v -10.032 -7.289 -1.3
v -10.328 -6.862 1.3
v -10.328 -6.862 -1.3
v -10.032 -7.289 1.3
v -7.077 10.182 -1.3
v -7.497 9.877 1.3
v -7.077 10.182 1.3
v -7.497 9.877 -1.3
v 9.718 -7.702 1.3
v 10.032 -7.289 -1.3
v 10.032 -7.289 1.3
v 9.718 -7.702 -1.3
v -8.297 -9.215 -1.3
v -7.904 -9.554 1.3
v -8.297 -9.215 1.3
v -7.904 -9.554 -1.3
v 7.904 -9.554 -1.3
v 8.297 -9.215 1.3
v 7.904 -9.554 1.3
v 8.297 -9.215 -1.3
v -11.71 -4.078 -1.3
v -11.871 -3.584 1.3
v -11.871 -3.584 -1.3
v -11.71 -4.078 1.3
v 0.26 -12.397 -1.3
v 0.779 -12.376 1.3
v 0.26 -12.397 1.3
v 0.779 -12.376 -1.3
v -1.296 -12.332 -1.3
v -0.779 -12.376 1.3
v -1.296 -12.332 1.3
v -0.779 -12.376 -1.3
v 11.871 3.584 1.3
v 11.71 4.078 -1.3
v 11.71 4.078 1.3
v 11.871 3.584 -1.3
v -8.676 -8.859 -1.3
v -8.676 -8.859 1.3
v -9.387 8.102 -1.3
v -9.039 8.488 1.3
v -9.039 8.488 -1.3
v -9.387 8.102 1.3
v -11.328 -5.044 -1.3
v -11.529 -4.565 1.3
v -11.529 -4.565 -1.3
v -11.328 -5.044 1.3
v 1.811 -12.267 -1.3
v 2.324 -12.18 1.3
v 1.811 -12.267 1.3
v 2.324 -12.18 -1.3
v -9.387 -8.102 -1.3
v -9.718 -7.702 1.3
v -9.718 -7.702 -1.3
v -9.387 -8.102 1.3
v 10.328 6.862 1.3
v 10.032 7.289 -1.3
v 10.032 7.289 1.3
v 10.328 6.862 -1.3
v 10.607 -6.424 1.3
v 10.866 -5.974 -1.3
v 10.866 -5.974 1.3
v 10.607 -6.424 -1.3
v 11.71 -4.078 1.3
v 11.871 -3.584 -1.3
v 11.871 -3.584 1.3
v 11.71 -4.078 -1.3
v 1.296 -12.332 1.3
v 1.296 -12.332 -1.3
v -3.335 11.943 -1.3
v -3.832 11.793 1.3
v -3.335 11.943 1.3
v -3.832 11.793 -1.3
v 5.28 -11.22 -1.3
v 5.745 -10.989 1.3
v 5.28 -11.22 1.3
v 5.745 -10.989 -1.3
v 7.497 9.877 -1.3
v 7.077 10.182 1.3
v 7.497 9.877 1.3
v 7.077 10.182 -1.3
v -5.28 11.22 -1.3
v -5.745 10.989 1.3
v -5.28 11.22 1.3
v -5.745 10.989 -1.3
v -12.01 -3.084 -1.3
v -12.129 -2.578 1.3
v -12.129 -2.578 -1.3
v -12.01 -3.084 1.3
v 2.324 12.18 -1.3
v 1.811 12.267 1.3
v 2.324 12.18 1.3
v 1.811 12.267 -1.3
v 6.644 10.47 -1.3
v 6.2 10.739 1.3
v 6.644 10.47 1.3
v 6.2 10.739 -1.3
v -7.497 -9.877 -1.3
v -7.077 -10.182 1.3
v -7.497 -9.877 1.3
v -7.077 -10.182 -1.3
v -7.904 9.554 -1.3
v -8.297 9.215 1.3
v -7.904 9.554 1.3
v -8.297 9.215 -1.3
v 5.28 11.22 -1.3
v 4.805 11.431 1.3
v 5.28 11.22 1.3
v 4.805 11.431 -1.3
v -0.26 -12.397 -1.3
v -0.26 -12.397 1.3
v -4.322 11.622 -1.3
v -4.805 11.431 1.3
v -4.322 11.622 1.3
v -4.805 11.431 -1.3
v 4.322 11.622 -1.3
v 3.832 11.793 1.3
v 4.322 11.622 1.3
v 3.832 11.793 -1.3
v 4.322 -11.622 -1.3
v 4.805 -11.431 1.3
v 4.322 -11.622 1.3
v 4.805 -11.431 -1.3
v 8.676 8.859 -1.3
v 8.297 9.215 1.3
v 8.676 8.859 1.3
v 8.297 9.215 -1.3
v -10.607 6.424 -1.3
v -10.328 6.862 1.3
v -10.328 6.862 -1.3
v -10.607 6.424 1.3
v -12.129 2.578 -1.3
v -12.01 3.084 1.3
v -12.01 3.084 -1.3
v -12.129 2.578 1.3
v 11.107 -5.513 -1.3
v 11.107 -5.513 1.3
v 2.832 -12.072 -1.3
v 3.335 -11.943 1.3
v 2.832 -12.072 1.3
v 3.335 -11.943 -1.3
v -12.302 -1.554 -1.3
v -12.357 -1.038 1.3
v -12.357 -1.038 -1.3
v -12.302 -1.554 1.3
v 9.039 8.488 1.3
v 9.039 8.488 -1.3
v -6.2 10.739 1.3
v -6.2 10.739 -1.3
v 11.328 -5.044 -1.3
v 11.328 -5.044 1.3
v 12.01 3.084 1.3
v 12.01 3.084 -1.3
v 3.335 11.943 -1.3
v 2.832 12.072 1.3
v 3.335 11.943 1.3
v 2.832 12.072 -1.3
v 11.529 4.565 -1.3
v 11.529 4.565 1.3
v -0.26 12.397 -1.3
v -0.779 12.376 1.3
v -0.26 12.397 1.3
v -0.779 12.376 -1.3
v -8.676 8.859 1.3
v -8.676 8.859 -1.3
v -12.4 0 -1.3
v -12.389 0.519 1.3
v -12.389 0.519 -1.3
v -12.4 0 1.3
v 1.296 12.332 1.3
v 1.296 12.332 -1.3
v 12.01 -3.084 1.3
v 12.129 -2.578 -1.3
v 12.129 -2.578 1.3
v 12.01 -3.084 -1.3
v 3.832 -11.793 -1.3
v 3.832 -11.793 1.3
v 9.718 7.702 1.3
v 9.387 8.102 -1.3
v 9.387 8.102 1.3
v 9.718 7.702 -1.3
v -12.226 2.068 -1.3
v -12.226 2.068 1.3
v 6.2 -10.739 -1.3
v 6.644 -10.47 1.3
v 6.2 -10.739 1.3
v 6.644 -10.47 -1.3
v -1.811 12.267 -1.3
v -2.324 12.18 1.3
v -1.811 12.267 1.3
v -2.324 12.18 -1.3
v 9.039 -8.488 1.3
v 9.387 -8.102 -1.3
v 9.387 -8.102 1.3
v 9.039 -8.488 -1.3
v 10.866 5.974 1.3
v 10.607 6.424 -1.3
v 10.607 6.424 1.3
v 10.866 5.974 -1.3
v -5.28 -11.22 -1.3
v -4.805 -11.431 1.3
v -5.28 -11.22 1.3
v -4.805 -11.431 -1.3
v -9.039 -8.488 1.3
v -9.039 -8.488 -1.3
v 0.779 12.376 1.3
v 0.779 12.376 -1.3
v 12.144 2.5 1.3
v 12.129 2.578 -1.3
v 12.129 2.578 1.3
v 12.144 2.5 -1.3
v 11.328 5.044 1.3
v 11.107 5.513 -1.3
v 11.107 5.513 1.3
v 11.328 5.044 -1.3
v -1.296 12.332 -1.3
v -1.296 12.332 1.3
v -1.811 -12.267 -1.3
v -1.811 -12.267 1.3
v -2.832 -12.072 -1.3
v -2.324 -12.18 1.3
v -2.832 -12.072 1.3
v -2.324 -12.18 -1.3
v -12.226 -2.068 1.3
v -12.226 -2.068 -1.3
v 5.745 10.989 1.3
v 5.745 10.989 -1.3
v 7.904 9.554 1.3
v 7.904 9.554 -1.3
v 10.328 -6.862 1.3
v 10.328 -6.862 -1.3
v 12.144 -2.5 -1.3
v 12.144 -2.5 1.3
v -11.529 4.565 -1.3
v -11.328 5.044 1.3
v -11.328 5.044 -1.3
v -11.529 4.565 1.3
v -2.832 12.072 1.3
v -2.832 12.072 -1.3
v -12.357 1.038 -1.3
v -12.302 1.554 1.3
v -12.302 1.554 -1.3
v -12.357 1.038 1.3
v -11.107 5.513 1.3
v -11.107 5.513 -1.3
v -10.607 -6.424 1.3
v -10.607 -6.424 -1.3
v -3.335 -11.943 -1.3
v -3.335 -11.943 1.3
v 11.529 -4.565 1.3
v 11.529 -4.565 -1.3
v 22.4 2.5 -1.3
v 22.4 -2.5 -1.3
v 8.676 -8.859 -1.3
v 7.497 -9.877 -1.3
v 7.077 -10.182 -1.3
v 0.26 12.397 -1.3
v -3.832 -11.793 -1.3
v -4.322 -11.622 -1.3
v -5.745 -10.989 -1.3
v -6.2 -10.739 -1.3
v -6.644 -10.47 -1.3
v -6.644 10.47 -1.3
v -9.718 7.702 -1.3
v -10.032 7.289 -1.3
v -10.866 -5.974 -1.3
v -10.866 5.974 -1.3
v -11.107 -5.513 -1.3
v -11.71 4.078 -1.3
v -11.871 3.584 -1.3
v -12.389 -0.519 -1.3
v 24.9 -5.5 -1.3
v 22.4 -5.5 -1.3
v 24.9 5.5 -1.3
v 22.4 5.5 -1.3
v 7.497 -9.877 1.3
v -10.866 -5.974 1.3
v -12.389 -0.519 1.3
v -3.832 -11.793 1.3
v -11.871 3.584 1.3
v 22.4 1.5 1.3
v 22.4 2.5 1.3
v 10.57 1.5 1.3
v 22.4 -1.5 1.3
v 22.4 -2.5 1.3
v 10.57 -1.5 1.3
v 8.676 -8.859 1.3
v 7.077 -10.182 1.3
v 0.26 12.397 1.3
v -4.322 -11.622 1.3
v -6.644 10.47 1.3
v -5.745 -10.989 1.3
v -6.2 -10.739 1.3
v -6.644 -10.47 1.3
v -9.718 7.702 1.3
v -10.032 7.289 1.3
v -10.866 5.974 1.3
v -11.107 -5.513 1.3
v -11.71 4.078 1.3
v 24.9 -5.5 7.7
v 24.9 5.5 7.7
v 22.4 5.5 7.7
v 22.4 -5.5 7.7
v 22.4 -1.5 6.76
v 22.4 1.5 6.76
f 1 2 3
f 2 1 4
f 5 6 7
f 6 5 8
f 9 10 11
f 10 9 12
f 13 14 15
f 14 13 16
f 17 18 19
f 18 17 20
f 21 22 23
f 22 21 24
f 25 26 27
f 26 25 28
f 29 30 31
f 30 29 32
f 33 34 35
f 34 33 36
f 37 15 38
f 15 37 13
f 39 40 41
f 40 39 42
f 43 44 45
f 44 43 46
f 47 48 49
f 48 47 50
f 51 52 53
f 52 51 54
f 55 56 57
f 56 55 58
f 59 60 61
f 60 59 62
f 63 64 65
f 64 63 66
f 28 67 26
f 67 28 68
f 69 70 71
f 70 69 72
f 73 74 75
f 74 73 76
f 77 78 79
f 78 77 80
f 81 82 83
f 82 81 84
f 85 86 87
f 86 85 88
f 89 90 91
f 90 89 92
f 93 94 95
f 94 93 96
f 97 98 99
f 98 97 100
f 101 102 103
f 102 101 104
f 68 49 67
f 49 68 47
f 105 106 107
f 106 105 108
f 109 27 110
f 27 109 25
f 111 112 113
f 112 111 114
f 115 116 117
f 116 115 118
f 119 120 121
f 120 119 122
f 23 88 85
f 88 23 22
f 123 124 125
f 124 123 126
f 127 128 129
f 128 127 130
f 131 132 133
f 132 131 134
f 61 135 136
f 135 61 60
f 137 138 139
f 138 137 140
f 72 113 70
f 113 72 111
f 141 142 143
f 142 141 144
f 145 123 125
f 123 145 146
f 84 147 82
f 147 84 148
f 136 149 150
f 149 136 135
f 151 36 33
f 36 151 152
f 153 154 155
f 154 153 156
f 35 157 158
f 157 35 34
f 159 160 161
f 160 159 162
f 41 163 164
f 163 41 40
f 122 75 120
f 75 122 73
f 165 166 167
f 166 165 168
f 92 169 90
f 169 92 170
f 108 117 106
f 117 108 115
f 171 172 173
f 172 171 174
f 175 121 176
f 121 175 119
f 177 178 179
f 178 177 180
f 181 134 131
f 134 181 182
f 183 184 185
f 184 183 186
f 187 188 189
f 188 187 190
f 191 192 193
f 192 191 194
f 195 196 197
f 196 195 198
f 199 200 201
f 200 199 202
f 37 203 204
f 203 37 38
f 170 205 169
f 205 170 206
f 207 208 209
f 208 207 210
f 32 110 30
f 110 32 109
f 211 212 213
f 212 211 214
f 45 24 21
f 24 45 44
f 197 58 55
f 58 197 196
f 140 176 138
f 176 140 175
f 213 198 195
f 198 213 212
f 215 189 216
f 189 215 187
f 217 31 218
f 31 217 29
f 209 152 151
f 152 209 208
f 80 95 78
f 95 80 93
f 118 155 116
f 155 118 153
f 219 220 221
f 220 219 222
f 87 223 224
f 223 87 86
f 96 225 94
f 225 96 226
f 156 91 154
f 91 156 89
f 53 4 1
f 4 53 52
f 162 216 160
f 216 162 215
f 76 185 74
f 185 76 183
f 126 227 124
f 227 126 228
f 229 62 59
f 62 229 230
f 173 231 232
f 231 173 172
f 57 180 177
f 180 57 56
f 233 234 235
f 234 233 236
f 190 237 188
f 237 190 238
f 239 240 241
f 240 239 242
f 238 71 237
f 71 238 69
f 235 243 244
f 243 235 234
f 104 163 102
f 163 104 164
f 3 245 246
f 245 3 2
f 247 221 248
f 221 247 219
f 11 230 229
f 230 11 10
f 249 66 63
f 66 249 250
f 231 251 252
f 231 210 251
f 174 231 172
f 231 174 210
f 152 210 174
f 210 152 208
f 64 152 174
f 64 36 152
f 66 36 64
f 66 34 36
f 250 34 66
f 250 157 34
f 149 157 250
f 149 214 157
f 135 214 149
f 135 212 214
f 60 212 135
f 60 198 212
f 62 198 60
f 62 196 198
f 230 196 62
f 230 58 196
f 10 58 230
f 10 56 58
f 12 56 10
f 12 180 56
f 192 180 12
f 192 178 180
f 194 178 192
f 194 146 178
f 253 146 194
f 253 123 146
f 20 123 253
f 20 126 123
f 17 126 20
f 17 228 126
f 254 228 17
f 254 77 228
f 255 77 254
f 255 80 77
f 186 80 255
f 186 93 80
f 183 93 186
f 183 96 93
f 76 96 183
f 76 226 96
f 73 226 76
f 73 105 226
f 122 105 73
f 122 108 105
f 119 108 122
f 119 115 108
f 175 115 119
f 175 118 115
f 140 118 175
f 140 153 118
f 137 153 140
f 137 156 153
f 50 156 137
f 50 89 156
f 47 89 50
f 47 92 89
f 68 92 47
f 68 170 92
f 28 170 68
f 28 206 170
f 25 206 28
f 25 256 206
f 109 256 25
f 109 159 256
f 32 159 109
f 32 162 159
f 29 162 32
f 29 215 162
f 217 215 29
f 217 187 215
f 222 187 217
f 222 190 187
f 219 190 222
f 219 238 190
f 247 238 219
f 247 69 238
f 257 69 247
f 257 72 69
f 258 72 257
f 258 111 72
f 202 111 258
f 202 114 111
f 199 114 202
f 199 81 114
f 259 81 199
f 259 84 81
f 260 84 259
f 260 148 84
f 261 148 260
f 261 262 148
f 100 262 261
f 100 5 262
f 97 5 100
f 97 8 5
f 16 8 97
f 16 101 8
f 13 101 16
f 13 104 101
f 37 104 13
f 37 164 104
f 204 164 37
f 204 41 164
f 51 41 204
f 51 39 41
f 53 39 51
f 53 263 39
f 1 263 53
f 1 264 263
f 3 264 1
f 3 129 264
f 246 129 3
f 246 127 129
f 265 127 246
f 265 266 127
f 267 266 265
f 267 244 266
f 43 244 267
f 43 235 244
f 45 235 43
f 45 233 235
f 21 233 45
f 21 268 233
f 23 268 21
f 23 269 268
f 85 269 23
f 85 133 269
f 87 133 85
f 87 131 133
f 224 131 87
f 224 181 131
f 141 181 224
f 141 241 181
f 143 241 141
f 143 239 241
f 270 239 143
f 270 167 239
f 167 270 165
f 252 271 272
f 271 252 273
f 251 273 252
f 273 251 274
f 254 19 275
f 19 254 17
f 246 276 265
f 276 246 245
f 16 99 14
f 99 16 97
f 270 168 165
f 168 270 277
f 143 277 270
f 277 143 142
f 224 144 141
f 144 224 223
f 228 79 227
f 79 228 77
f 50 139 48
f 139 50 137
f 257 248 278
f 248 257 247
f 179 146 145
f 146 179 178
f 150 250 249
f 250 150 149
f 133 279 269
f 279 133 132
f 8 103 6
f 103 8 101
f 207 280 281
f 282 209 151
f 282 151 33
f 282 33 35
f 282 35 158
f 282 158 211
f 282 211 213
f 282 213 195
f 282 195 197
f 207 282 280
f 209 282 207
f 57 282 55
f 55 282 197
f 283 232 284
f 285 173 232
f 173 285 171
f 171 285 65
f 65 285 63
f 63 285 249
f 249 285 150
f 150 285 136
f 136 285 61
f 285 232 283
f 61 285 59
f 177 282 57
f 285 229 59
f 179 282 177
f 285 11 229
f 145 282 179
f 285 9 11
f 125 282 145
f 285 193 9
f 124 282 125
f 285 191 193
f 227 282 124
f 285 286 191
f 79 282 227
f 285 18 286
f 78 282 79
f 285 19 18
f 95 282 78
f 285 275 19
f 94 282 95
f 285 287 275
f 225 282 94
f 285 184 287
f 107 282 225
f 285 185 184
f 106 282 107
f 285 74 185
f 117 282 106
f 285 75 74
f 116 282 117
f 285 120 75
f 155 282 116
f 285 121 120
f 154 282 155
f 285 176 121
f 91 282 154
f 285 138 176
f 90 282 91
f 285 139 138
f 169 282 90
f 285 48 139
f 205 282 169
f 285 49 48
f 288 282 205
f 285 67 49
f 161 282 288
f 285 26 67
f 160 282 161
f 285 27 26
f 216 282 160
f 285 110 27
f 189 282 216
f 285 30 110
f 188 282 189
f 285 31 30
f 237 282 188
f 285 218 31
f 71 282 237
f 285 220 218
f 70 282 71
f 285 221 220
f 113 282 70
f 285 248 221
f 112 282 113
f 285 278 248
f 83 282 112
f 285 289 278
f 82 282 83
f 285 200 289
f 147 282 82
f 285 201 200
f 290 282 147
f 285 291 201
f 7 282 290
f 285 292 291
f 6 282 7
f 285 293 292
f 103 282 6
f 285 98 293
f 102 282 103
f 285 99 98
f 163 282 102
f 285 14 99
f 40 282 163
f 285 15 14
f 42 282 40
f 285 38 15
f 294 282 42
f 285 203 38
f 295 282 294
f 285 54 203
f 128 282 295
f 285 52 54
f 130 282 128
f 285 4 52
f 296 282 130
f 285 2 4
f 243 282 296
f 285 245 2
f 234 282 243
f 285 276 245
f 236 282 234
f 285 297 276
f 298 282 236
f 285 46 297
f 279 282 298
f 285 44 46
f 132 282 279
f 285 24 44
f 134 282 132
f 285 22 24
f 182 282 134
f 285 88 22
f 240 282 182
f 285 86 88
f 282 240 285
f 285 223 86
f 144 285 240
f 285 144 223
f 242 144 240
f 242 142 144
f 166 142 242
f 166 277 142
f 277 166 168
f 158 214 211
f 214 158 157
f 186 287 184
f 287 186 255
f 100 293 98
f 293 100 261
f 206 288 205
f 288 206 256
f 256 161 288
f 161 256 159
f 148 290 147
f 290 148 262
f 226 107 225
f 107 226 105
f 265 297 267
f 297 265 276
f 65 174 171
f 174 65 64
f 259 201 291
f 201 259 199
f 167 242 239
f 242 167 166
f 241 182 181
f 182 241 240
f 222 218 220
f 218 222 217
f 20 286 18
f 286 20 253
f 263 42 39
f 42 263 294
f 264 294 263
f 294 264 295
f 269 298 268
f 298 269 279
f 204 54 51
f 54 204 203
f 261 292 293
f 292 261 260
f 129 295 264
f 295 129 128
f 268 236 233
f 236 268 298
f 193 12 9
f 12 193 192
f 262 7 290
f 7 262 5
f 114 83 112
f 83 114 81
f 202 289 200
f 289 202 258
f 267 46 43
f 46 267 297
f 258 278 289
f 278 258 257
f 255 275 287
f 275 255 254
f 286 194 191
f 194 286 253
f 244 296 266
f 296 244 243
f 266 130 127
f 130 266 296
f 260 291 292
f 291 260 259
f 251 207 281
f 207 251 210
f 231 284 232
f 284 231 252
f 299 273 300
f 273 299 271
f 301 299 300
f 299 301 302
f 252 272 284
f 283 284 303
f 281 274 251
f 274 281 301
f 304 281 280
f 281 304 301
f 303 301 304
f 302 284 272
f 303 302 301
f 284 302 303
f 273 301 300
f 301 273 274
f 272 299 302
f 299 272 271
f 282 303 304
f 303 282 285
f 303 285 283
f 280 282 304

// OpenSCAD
$fn=150;
// I created this after observing an elderly person attemping to insert a coin in an Australian Aldi trolley. This design should help people by providing a flat area to push against. I have printed these at 0.2mm Layer thickness with a 0.3mm nozzle with good results. This is provided free to anyone who needs it.

// Please forgive any code errors. This is my first Scad design.

CoinWidth = 24.8; //This is the diameter of the Coin/Token needed
CoinThickness = 2.6; //This is the thickness of the Coin/Token needed.


        cylinder(h=CoinThickness, r=CoinWidth/2, center=true);
    translate([(CoinWidth/2)+4,0,0])
        cube([13,5,CoinThickness],true);
    translate([(CoinWidth/2)+10,-5.5,-CoinThickness/2])
        cube([2.5,11,9],false);
    
     rotate([0,0,-90])
     translate([-1.5,(CoinWidth/2)-(CoinWidth/10),1])
        prism(3,13,6);
    
module prism(l, w, h){
    polyhedron(
         points=[[0,0,0], [l,0,0], [l,w,0], [0,w,0], [0,w,h], [l,w,h]],
         faces=[[0,1,2,3],[5,4,3,2],[0,4,5,1],[0,3,4],[5,2,1]]
               );
     }
